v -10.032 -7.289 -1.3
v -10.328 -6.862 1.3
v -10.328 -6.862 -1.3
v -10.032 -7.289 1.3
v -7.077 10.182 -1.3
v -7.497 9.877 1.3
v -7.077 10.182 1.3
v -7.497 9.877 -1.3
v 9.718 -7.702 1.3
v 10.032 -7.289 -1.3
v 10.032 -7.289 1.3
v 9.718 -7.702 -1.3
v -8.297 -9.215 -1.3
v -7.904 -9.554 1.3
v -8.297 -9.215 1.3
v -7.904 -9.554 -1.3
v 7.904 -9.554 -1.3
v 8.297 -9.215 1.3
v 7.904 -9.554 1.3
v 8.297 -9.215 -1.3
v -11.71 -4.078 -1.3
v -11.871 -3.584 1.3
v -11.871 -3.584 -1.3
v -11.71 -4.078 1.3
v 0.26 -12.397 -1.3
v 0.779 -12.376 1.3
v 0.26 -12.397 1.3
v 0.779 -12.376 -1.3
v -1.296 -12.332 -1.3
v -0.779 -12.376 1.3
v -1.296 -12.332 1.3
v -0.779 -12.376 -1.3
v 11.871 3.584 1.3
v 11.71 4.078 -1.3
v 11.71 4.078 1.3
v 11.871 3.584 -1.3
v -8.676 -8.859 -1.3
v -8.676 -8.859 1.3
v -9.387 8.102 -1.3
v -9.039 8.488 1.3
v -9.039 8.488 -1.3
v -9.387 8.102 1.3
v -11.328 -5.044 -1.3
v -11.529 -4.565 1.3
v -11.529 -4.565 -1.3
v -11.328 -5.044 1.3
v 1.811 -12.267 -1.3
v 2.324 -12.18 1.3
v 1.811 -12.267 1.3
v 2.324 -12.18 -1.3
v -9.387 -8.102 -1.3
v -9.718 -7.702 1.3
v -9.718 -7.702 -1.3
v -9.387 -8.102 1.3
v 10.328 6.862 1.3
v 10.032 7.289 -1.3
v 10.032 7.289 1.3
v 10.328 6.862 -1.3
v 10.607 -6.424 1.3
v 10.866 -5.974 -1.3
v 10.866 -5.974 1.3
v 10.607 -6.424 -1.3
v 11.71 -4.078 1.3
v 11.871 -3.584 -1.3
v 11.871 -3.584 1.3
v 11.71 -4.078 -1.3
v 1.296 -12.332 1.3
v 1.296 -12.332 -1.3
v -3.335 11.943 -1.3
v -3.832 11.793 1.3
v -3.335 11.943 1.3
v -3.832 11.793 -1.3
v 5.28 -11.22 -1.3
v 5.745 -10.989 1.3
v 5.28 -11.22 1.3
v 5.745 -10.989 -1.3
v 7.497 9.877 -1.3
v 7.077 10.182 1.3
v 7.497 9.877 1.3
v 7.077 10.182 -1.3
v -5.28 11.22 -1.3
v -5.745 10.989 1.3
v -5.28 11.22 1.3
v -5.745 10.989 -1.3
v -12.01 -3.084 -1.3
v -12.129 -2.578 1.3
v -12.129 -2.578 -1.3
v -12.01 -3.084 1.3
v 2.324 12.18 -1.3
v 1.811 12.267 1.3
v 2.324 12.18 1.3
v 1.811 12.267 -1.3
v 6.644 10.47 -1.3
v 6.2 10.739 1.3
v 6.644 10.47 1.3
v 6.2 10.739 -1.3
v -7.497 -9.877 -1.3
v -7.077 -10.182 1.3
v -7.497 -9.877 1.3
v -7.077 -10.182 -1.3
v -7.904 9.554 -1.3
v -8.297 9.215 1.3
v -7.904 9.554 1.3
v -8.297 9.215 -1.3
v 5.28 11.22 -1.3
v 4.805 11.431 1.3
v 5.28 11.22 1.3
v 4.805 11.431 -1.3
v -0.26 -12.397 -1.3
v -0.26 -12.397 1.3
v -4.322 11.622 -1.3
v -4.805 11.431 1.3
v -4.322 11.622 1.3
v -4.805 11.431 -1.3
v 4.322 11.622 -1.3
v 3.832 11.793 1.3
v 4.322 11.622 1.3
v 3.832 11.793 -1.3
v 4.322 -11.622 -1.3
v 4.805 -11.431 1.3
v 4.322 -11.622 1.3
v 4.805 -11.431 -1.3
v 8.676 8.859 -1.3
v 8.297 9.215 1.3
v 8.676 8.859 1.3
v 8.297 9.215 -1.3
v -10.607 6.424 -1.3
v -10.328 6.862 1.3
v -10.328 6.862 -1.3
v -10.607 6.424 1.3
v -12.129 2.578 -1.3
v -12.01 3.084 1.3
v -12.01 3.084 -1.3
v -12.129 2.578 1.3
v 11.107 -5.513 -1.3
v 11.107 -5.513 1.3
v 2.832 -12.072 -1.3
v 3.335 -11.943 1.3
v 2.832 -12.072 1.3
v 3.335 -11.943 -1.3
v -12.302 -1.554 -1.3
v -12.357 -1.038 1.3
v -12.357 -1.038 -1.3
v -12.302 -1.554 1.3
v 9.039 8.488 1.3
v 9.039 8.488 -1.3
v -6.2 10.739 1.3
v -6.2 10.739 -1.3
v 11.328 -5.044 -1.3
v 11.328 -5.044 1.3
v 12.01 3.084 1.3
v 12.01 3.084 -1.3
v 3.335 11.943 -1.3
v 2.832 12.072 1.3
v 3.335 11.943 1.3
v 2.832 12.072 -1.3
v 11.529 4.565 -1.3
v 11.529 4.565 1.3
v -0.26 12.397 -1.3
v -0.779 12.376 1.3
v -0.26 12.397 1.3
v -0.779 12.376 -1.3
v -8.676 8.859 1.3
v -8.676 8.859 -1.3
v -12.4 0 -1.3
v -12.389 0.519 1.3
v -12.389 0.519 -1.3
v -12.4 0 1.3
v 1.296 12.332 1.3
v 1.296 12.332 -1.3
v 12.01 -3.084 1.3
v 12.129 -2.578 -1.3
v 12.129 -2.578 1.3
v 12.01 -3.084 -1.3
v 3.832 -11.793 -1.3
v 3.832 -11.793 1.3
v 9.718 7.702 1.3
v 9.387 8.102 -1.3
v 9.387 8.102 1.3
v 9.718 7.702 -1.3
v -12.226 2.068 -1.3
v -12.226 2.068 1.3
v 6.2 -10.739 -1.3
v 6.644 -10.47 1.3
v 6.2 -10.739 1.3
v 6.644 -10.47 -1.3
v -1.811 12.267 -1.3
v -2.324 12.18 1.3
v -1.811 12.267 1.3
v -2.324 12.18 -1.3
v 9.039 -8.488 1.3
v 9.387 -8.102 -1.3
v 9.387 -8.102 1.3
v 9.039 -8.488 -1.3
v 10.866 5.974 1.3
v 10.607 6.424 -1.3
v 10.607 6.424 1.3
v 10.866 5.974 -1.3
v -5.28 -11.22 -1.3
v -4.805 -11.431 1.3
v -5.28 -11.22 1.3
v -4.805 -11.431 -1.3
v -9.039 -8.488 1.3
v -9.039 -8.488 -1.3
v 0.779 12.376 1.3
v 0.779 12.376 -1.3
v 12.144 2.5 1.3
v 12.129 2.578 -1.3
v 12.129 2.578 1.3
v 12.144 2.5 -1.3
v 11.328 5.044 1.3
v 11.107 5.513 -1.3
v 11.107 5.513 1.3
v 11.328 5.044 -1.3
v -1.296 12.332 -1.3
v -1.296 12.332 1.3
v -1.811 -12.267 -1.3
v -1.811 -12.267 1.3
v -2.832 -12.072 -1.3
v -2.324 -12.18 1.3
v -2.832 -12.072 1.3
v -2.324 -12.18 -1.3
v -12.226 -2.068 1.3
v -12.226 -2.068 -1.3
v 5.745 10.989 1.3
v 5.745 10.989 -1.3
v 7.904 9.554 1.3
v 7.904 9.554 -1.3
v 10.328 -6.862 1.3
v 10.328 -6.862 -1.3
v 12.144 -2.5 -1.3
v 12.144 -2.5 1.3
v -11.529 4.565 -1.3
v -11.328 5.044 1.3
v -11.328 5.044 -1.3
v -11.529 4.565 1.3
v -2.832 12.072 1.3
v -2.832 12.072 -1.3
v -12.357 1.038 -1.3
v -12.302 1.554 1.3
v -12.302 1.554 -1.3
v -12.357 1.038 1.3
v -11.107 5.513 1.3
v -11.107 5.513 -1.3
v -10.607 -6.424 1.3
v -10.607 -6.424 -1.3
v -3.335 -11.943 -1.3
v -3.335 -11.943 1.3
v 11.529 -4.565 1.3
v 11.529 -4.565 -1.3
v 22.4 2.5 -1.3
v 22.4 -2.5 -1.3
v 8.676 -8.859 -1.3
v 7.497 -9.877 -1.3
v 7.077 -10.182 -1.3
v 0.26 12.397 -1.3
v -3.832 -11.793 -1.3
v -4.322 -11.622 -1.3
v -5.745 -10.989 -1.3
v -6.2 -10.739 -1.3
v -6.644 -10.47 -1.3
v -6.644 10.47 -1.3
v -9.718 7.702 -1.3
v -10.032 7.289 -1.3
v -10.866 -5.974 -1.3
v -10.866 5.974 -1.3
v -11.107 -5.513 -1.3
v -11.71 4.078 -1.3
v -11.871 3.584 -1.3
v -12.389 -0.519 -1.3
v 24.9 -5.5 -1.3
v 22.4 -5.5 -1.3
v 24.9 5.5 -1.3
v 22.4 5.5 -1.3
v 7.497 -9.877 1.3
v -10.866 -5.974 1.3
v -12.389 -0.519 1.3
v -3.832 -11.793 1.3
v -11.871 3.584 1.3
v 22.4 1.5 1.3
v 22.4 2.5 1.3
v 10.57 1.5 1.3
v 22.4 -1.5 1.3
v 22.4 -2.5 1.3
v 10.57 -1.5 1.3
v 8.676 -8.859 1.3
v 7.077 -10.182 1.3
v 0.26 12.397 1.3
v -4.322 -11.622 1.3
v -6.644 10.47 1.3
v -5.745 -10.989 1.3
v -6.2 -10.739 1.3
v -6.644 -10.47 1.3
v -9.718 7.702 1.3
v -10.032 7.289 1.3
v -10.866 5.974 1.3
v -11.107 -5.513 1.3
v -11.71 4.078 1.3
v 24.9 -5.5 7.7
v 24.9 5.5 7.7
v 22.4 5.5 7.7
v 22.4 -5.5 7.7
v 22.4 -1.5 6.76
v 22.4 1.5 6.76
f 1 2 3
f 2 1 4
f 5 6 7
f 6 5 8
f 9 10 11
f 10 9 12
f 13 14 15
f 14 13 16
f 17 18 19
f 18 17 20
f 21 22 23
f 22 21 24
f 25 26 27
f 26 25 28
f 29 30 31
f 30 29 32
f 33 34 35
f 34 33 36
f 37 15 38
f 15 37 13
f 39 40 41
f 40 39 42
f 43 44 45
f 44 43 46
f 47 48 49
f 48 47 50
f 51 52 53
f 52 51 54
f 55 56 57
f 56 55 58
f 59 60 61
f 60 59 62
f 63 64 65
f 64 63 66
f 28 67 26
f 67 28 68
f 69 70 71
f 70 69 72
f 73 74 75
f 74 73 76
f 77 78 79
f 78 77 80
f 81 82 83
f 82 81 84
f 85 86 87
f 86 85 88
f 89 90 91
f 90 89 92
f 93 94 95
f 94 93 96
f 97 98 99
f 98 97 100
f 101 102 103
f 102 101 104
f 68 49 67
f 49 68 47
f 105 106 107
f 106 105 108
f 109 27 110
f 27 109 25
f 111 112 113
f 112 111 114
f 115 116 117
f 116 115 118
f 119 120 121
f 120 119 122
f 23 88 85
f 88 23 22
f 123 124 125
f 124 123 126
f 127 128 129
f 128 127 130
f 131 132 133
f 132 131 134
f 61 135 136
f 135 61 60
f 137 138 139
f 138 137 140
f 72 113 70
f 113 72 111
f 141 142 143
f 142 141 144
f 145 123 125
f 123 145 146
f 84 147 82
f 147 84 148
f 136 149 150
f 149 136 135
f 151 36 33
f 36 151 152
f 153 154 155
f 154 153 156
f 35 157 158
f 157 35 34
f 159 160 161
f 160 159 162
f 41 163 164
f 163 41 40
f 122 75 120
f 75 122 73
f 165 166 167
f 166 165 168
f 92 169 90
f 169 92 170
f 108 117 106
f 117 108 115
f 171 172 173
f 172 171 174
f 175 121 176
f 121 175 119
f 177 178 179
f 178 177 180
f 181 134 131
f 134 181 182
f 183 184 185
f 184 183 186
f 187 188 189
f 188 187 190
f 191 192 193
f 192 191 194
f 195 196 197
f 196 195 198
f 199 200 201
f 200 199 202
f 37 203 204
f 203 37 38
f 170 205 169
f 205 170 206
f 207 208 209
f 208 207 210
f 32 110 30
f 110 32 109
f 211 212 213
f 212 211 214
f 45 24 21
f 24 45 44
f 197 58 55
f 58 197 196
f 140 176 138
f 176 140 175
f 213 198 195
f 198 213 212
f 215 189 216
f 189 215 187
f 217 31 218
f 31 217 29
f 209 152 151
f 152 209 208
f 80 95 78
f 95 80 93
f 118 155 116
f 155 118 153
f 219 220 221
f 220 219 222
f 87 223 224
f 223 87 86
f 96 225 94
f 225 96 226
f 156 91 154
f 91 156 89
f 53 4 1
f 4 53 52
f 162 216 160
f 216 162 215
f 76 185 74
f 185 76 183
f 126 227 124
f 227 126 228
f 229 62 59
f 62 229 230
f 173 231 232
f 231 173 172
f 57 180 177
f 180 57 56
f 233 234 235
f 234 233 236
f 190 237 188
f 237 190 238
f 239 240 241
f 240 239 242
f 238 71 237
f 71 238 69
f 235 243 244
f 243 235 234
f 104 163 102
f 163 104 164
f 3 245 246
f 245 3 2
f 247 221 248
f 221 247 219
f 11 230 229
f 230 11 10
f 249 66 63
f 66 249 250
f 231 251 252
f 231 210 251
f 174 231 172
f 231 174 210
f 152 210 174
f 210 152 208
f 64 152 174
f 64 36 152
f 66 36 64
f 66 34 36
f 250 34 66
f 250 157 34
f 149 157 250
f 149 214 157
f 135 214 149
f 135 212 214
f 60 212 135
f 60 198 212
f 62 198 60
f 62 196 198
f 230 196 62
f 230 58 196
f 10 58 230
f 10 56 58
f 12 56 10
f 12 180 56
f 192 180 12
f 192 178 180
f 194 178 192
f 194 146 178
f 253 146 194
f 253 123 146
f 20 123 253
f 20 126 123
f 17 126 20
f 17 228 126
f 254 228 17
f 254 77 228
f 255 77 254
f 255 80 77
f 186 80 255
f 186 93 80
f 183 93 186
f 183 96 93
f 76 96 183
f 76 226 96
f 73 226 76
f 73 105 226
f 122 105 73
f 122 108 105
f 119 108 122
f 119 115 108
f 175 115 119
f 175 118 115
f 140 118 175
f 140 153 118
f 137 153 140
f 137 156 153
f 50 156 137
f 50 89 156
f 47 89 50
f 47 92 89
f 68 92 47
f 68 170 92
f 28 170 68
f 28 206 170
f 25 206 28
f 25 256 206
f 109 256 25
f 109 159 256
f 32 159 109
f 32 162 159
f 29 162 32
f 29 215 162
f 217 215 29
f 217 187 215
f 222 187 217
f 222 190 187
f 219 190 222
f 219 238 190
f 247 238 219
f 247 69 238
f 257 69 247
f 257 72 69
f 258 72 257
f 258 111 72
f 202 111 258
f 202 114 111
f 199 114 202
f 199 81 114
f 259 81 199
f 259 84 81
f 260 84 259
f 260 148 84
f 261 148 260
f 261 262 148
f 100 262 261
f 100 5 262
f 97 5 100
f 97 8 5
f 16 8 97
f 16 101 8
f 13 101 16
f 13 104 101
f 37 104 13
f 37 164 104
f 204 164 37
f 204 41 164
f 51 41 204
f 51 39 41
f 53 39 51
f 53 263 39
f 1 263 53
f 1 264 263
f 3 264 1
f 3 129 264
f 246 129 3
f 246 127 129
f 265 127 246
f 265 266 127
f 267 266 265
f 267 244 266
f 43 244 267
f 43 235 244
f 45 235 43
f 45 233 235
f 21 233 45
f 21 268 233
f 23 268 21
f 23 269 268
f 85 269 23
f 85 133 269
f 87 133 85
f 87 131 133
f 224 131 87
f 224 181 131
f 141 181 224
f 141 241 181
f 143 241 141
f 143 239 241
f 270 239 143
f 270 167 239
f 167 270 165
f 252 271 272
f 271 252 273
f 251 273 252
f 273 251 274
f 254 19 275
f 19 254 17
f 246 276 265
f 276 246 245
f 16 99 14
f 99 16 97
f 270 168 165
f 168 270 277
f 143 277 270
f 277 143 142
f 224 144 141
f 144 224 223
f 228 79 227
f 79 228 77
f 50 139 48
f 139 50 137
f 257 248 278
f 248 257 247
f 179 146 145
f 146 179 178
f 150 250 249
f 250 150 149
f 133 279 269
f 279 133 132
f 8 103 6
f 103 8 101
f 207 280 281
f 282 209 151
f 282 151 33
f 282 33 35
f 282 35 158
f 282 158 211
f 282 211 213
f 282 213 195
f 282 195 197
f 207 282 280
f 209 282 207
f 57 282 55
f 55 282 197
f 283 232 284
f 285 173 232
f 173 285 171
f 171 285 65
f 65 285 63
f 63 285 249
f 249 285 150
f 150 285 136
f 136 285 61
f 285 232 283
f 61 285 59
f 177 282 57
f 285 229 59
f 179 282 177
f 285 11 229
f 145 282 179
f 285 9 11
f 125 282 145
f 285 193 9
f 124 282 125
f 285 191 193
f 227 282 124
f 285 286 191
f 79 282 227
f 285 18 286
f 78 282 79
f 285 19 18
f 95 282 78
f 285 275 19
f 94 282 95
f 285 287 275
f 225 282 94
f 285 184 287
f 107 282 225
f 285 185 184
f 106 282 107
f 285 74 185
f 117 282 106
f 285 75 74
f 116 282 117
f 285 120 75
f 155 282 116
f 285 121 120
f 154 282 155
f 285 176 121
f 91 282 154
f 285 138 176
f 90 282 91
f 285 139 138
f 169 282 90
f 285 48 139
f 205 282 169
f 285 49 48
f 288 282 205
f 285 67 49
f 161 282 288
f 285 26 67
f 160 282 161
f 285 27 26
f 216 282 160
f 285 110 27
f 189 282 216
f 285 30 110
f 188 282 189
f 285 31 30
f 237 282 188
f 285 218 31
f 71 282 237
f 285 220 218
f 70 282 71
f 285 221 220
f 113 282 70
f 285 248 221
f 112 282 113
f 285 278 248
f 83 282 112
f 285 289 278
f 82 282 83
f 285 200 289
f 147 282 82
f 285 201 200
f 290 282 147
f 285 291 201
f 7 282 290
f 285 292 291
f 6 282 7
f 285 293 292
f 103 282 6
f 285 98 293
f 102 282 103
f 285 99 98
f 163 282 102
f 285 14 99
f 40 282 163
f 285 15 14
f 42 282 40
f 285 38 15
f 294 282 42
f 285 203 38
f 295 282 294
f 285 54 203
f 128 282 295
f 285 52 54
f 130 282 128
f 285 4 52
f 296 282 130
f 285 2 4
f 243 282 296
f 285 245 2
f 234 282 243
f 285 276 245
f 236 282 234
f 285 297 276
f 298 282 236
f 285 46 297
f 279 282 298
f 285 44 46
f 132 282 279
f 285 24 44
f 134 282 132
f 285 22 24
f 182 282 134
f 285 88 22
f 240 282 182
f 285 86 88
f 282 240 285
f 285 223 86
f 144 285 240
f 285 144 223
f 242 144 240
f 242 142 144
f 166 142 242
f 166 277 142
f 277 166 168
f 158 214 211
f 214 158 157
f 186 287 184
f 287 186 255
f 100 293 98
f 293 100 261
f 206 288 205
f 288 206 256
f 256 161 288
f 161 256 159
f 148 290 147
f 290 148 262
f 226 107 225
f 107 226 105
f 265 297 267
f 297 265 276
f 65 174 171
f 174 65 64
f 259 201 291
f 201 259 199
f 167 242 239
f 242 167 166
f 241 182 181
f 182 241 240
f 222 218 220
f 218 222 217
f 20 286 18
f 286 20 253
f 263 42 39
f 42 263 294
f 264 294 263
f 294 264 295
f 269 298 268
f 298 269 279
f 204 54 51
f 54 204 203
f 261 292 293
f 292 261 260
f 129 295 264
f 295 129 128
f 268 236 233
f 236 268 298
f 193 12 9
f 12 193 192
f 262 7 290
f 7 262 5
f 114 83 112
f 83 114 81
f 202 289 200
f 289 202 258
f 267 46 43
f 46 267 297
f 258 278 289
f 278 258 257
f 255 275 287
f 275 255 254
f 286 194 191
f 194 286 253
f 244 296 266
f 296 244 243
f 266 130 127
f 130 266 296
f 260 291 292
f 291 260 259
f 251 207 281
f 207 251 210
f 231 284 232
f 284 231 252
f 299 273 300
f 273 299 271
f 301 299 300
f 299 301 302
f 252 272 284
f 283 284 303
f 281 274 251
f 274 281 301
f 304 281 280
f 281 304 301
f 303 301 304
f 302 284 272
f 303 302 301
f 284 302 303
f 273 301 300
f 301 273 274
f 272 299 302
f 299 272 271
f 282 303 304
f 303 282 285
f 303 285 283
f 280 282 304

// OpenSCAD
$fn=150;
// I created this after observing an elderly person attemping to insert a coin in an Australian Aldi trolley. This design should help people by providing a flat area to push against. I have printed these at 0.2mm Layer thickness with a 0.3mm nozzle with good results. This is provided free to anyone who needs it.

// Please forgive any code errors. This is my first Scad design.

CoinWidth = 24.8; //This is the diameter of the Coin/Token needed
CoinThickness = 2.6; //This is the thickness of the Coin/Token needed.


        cylinder(h=CoinThickness, r=CoinWidth/2, center=true);
    translate([(CoinWidth/2)+4,0,0])
        cube([13,5,CoinThickness],true);
    translate([(CoinWidth/2)+10,-5.5,-CoinThickness/2])
        cube([2.5,11,9],false);
    
     rotate([0,0,-90])
     translate([-1.5,(CoinWidth/2)-(CoinWidth/10),1])
        prism(3,13,6);
    
module prism(l, w, h){
    polyhedron(
         points=[[0,0,0], [l,0,0], [l,w,0], [0,w,0], [0,w,h], [l,w,h]],
         faces=[[0,1,2,3],[5,4,3,2],[0,4,5,1],[0,3,4],[5,2,1]]
               );
     }
